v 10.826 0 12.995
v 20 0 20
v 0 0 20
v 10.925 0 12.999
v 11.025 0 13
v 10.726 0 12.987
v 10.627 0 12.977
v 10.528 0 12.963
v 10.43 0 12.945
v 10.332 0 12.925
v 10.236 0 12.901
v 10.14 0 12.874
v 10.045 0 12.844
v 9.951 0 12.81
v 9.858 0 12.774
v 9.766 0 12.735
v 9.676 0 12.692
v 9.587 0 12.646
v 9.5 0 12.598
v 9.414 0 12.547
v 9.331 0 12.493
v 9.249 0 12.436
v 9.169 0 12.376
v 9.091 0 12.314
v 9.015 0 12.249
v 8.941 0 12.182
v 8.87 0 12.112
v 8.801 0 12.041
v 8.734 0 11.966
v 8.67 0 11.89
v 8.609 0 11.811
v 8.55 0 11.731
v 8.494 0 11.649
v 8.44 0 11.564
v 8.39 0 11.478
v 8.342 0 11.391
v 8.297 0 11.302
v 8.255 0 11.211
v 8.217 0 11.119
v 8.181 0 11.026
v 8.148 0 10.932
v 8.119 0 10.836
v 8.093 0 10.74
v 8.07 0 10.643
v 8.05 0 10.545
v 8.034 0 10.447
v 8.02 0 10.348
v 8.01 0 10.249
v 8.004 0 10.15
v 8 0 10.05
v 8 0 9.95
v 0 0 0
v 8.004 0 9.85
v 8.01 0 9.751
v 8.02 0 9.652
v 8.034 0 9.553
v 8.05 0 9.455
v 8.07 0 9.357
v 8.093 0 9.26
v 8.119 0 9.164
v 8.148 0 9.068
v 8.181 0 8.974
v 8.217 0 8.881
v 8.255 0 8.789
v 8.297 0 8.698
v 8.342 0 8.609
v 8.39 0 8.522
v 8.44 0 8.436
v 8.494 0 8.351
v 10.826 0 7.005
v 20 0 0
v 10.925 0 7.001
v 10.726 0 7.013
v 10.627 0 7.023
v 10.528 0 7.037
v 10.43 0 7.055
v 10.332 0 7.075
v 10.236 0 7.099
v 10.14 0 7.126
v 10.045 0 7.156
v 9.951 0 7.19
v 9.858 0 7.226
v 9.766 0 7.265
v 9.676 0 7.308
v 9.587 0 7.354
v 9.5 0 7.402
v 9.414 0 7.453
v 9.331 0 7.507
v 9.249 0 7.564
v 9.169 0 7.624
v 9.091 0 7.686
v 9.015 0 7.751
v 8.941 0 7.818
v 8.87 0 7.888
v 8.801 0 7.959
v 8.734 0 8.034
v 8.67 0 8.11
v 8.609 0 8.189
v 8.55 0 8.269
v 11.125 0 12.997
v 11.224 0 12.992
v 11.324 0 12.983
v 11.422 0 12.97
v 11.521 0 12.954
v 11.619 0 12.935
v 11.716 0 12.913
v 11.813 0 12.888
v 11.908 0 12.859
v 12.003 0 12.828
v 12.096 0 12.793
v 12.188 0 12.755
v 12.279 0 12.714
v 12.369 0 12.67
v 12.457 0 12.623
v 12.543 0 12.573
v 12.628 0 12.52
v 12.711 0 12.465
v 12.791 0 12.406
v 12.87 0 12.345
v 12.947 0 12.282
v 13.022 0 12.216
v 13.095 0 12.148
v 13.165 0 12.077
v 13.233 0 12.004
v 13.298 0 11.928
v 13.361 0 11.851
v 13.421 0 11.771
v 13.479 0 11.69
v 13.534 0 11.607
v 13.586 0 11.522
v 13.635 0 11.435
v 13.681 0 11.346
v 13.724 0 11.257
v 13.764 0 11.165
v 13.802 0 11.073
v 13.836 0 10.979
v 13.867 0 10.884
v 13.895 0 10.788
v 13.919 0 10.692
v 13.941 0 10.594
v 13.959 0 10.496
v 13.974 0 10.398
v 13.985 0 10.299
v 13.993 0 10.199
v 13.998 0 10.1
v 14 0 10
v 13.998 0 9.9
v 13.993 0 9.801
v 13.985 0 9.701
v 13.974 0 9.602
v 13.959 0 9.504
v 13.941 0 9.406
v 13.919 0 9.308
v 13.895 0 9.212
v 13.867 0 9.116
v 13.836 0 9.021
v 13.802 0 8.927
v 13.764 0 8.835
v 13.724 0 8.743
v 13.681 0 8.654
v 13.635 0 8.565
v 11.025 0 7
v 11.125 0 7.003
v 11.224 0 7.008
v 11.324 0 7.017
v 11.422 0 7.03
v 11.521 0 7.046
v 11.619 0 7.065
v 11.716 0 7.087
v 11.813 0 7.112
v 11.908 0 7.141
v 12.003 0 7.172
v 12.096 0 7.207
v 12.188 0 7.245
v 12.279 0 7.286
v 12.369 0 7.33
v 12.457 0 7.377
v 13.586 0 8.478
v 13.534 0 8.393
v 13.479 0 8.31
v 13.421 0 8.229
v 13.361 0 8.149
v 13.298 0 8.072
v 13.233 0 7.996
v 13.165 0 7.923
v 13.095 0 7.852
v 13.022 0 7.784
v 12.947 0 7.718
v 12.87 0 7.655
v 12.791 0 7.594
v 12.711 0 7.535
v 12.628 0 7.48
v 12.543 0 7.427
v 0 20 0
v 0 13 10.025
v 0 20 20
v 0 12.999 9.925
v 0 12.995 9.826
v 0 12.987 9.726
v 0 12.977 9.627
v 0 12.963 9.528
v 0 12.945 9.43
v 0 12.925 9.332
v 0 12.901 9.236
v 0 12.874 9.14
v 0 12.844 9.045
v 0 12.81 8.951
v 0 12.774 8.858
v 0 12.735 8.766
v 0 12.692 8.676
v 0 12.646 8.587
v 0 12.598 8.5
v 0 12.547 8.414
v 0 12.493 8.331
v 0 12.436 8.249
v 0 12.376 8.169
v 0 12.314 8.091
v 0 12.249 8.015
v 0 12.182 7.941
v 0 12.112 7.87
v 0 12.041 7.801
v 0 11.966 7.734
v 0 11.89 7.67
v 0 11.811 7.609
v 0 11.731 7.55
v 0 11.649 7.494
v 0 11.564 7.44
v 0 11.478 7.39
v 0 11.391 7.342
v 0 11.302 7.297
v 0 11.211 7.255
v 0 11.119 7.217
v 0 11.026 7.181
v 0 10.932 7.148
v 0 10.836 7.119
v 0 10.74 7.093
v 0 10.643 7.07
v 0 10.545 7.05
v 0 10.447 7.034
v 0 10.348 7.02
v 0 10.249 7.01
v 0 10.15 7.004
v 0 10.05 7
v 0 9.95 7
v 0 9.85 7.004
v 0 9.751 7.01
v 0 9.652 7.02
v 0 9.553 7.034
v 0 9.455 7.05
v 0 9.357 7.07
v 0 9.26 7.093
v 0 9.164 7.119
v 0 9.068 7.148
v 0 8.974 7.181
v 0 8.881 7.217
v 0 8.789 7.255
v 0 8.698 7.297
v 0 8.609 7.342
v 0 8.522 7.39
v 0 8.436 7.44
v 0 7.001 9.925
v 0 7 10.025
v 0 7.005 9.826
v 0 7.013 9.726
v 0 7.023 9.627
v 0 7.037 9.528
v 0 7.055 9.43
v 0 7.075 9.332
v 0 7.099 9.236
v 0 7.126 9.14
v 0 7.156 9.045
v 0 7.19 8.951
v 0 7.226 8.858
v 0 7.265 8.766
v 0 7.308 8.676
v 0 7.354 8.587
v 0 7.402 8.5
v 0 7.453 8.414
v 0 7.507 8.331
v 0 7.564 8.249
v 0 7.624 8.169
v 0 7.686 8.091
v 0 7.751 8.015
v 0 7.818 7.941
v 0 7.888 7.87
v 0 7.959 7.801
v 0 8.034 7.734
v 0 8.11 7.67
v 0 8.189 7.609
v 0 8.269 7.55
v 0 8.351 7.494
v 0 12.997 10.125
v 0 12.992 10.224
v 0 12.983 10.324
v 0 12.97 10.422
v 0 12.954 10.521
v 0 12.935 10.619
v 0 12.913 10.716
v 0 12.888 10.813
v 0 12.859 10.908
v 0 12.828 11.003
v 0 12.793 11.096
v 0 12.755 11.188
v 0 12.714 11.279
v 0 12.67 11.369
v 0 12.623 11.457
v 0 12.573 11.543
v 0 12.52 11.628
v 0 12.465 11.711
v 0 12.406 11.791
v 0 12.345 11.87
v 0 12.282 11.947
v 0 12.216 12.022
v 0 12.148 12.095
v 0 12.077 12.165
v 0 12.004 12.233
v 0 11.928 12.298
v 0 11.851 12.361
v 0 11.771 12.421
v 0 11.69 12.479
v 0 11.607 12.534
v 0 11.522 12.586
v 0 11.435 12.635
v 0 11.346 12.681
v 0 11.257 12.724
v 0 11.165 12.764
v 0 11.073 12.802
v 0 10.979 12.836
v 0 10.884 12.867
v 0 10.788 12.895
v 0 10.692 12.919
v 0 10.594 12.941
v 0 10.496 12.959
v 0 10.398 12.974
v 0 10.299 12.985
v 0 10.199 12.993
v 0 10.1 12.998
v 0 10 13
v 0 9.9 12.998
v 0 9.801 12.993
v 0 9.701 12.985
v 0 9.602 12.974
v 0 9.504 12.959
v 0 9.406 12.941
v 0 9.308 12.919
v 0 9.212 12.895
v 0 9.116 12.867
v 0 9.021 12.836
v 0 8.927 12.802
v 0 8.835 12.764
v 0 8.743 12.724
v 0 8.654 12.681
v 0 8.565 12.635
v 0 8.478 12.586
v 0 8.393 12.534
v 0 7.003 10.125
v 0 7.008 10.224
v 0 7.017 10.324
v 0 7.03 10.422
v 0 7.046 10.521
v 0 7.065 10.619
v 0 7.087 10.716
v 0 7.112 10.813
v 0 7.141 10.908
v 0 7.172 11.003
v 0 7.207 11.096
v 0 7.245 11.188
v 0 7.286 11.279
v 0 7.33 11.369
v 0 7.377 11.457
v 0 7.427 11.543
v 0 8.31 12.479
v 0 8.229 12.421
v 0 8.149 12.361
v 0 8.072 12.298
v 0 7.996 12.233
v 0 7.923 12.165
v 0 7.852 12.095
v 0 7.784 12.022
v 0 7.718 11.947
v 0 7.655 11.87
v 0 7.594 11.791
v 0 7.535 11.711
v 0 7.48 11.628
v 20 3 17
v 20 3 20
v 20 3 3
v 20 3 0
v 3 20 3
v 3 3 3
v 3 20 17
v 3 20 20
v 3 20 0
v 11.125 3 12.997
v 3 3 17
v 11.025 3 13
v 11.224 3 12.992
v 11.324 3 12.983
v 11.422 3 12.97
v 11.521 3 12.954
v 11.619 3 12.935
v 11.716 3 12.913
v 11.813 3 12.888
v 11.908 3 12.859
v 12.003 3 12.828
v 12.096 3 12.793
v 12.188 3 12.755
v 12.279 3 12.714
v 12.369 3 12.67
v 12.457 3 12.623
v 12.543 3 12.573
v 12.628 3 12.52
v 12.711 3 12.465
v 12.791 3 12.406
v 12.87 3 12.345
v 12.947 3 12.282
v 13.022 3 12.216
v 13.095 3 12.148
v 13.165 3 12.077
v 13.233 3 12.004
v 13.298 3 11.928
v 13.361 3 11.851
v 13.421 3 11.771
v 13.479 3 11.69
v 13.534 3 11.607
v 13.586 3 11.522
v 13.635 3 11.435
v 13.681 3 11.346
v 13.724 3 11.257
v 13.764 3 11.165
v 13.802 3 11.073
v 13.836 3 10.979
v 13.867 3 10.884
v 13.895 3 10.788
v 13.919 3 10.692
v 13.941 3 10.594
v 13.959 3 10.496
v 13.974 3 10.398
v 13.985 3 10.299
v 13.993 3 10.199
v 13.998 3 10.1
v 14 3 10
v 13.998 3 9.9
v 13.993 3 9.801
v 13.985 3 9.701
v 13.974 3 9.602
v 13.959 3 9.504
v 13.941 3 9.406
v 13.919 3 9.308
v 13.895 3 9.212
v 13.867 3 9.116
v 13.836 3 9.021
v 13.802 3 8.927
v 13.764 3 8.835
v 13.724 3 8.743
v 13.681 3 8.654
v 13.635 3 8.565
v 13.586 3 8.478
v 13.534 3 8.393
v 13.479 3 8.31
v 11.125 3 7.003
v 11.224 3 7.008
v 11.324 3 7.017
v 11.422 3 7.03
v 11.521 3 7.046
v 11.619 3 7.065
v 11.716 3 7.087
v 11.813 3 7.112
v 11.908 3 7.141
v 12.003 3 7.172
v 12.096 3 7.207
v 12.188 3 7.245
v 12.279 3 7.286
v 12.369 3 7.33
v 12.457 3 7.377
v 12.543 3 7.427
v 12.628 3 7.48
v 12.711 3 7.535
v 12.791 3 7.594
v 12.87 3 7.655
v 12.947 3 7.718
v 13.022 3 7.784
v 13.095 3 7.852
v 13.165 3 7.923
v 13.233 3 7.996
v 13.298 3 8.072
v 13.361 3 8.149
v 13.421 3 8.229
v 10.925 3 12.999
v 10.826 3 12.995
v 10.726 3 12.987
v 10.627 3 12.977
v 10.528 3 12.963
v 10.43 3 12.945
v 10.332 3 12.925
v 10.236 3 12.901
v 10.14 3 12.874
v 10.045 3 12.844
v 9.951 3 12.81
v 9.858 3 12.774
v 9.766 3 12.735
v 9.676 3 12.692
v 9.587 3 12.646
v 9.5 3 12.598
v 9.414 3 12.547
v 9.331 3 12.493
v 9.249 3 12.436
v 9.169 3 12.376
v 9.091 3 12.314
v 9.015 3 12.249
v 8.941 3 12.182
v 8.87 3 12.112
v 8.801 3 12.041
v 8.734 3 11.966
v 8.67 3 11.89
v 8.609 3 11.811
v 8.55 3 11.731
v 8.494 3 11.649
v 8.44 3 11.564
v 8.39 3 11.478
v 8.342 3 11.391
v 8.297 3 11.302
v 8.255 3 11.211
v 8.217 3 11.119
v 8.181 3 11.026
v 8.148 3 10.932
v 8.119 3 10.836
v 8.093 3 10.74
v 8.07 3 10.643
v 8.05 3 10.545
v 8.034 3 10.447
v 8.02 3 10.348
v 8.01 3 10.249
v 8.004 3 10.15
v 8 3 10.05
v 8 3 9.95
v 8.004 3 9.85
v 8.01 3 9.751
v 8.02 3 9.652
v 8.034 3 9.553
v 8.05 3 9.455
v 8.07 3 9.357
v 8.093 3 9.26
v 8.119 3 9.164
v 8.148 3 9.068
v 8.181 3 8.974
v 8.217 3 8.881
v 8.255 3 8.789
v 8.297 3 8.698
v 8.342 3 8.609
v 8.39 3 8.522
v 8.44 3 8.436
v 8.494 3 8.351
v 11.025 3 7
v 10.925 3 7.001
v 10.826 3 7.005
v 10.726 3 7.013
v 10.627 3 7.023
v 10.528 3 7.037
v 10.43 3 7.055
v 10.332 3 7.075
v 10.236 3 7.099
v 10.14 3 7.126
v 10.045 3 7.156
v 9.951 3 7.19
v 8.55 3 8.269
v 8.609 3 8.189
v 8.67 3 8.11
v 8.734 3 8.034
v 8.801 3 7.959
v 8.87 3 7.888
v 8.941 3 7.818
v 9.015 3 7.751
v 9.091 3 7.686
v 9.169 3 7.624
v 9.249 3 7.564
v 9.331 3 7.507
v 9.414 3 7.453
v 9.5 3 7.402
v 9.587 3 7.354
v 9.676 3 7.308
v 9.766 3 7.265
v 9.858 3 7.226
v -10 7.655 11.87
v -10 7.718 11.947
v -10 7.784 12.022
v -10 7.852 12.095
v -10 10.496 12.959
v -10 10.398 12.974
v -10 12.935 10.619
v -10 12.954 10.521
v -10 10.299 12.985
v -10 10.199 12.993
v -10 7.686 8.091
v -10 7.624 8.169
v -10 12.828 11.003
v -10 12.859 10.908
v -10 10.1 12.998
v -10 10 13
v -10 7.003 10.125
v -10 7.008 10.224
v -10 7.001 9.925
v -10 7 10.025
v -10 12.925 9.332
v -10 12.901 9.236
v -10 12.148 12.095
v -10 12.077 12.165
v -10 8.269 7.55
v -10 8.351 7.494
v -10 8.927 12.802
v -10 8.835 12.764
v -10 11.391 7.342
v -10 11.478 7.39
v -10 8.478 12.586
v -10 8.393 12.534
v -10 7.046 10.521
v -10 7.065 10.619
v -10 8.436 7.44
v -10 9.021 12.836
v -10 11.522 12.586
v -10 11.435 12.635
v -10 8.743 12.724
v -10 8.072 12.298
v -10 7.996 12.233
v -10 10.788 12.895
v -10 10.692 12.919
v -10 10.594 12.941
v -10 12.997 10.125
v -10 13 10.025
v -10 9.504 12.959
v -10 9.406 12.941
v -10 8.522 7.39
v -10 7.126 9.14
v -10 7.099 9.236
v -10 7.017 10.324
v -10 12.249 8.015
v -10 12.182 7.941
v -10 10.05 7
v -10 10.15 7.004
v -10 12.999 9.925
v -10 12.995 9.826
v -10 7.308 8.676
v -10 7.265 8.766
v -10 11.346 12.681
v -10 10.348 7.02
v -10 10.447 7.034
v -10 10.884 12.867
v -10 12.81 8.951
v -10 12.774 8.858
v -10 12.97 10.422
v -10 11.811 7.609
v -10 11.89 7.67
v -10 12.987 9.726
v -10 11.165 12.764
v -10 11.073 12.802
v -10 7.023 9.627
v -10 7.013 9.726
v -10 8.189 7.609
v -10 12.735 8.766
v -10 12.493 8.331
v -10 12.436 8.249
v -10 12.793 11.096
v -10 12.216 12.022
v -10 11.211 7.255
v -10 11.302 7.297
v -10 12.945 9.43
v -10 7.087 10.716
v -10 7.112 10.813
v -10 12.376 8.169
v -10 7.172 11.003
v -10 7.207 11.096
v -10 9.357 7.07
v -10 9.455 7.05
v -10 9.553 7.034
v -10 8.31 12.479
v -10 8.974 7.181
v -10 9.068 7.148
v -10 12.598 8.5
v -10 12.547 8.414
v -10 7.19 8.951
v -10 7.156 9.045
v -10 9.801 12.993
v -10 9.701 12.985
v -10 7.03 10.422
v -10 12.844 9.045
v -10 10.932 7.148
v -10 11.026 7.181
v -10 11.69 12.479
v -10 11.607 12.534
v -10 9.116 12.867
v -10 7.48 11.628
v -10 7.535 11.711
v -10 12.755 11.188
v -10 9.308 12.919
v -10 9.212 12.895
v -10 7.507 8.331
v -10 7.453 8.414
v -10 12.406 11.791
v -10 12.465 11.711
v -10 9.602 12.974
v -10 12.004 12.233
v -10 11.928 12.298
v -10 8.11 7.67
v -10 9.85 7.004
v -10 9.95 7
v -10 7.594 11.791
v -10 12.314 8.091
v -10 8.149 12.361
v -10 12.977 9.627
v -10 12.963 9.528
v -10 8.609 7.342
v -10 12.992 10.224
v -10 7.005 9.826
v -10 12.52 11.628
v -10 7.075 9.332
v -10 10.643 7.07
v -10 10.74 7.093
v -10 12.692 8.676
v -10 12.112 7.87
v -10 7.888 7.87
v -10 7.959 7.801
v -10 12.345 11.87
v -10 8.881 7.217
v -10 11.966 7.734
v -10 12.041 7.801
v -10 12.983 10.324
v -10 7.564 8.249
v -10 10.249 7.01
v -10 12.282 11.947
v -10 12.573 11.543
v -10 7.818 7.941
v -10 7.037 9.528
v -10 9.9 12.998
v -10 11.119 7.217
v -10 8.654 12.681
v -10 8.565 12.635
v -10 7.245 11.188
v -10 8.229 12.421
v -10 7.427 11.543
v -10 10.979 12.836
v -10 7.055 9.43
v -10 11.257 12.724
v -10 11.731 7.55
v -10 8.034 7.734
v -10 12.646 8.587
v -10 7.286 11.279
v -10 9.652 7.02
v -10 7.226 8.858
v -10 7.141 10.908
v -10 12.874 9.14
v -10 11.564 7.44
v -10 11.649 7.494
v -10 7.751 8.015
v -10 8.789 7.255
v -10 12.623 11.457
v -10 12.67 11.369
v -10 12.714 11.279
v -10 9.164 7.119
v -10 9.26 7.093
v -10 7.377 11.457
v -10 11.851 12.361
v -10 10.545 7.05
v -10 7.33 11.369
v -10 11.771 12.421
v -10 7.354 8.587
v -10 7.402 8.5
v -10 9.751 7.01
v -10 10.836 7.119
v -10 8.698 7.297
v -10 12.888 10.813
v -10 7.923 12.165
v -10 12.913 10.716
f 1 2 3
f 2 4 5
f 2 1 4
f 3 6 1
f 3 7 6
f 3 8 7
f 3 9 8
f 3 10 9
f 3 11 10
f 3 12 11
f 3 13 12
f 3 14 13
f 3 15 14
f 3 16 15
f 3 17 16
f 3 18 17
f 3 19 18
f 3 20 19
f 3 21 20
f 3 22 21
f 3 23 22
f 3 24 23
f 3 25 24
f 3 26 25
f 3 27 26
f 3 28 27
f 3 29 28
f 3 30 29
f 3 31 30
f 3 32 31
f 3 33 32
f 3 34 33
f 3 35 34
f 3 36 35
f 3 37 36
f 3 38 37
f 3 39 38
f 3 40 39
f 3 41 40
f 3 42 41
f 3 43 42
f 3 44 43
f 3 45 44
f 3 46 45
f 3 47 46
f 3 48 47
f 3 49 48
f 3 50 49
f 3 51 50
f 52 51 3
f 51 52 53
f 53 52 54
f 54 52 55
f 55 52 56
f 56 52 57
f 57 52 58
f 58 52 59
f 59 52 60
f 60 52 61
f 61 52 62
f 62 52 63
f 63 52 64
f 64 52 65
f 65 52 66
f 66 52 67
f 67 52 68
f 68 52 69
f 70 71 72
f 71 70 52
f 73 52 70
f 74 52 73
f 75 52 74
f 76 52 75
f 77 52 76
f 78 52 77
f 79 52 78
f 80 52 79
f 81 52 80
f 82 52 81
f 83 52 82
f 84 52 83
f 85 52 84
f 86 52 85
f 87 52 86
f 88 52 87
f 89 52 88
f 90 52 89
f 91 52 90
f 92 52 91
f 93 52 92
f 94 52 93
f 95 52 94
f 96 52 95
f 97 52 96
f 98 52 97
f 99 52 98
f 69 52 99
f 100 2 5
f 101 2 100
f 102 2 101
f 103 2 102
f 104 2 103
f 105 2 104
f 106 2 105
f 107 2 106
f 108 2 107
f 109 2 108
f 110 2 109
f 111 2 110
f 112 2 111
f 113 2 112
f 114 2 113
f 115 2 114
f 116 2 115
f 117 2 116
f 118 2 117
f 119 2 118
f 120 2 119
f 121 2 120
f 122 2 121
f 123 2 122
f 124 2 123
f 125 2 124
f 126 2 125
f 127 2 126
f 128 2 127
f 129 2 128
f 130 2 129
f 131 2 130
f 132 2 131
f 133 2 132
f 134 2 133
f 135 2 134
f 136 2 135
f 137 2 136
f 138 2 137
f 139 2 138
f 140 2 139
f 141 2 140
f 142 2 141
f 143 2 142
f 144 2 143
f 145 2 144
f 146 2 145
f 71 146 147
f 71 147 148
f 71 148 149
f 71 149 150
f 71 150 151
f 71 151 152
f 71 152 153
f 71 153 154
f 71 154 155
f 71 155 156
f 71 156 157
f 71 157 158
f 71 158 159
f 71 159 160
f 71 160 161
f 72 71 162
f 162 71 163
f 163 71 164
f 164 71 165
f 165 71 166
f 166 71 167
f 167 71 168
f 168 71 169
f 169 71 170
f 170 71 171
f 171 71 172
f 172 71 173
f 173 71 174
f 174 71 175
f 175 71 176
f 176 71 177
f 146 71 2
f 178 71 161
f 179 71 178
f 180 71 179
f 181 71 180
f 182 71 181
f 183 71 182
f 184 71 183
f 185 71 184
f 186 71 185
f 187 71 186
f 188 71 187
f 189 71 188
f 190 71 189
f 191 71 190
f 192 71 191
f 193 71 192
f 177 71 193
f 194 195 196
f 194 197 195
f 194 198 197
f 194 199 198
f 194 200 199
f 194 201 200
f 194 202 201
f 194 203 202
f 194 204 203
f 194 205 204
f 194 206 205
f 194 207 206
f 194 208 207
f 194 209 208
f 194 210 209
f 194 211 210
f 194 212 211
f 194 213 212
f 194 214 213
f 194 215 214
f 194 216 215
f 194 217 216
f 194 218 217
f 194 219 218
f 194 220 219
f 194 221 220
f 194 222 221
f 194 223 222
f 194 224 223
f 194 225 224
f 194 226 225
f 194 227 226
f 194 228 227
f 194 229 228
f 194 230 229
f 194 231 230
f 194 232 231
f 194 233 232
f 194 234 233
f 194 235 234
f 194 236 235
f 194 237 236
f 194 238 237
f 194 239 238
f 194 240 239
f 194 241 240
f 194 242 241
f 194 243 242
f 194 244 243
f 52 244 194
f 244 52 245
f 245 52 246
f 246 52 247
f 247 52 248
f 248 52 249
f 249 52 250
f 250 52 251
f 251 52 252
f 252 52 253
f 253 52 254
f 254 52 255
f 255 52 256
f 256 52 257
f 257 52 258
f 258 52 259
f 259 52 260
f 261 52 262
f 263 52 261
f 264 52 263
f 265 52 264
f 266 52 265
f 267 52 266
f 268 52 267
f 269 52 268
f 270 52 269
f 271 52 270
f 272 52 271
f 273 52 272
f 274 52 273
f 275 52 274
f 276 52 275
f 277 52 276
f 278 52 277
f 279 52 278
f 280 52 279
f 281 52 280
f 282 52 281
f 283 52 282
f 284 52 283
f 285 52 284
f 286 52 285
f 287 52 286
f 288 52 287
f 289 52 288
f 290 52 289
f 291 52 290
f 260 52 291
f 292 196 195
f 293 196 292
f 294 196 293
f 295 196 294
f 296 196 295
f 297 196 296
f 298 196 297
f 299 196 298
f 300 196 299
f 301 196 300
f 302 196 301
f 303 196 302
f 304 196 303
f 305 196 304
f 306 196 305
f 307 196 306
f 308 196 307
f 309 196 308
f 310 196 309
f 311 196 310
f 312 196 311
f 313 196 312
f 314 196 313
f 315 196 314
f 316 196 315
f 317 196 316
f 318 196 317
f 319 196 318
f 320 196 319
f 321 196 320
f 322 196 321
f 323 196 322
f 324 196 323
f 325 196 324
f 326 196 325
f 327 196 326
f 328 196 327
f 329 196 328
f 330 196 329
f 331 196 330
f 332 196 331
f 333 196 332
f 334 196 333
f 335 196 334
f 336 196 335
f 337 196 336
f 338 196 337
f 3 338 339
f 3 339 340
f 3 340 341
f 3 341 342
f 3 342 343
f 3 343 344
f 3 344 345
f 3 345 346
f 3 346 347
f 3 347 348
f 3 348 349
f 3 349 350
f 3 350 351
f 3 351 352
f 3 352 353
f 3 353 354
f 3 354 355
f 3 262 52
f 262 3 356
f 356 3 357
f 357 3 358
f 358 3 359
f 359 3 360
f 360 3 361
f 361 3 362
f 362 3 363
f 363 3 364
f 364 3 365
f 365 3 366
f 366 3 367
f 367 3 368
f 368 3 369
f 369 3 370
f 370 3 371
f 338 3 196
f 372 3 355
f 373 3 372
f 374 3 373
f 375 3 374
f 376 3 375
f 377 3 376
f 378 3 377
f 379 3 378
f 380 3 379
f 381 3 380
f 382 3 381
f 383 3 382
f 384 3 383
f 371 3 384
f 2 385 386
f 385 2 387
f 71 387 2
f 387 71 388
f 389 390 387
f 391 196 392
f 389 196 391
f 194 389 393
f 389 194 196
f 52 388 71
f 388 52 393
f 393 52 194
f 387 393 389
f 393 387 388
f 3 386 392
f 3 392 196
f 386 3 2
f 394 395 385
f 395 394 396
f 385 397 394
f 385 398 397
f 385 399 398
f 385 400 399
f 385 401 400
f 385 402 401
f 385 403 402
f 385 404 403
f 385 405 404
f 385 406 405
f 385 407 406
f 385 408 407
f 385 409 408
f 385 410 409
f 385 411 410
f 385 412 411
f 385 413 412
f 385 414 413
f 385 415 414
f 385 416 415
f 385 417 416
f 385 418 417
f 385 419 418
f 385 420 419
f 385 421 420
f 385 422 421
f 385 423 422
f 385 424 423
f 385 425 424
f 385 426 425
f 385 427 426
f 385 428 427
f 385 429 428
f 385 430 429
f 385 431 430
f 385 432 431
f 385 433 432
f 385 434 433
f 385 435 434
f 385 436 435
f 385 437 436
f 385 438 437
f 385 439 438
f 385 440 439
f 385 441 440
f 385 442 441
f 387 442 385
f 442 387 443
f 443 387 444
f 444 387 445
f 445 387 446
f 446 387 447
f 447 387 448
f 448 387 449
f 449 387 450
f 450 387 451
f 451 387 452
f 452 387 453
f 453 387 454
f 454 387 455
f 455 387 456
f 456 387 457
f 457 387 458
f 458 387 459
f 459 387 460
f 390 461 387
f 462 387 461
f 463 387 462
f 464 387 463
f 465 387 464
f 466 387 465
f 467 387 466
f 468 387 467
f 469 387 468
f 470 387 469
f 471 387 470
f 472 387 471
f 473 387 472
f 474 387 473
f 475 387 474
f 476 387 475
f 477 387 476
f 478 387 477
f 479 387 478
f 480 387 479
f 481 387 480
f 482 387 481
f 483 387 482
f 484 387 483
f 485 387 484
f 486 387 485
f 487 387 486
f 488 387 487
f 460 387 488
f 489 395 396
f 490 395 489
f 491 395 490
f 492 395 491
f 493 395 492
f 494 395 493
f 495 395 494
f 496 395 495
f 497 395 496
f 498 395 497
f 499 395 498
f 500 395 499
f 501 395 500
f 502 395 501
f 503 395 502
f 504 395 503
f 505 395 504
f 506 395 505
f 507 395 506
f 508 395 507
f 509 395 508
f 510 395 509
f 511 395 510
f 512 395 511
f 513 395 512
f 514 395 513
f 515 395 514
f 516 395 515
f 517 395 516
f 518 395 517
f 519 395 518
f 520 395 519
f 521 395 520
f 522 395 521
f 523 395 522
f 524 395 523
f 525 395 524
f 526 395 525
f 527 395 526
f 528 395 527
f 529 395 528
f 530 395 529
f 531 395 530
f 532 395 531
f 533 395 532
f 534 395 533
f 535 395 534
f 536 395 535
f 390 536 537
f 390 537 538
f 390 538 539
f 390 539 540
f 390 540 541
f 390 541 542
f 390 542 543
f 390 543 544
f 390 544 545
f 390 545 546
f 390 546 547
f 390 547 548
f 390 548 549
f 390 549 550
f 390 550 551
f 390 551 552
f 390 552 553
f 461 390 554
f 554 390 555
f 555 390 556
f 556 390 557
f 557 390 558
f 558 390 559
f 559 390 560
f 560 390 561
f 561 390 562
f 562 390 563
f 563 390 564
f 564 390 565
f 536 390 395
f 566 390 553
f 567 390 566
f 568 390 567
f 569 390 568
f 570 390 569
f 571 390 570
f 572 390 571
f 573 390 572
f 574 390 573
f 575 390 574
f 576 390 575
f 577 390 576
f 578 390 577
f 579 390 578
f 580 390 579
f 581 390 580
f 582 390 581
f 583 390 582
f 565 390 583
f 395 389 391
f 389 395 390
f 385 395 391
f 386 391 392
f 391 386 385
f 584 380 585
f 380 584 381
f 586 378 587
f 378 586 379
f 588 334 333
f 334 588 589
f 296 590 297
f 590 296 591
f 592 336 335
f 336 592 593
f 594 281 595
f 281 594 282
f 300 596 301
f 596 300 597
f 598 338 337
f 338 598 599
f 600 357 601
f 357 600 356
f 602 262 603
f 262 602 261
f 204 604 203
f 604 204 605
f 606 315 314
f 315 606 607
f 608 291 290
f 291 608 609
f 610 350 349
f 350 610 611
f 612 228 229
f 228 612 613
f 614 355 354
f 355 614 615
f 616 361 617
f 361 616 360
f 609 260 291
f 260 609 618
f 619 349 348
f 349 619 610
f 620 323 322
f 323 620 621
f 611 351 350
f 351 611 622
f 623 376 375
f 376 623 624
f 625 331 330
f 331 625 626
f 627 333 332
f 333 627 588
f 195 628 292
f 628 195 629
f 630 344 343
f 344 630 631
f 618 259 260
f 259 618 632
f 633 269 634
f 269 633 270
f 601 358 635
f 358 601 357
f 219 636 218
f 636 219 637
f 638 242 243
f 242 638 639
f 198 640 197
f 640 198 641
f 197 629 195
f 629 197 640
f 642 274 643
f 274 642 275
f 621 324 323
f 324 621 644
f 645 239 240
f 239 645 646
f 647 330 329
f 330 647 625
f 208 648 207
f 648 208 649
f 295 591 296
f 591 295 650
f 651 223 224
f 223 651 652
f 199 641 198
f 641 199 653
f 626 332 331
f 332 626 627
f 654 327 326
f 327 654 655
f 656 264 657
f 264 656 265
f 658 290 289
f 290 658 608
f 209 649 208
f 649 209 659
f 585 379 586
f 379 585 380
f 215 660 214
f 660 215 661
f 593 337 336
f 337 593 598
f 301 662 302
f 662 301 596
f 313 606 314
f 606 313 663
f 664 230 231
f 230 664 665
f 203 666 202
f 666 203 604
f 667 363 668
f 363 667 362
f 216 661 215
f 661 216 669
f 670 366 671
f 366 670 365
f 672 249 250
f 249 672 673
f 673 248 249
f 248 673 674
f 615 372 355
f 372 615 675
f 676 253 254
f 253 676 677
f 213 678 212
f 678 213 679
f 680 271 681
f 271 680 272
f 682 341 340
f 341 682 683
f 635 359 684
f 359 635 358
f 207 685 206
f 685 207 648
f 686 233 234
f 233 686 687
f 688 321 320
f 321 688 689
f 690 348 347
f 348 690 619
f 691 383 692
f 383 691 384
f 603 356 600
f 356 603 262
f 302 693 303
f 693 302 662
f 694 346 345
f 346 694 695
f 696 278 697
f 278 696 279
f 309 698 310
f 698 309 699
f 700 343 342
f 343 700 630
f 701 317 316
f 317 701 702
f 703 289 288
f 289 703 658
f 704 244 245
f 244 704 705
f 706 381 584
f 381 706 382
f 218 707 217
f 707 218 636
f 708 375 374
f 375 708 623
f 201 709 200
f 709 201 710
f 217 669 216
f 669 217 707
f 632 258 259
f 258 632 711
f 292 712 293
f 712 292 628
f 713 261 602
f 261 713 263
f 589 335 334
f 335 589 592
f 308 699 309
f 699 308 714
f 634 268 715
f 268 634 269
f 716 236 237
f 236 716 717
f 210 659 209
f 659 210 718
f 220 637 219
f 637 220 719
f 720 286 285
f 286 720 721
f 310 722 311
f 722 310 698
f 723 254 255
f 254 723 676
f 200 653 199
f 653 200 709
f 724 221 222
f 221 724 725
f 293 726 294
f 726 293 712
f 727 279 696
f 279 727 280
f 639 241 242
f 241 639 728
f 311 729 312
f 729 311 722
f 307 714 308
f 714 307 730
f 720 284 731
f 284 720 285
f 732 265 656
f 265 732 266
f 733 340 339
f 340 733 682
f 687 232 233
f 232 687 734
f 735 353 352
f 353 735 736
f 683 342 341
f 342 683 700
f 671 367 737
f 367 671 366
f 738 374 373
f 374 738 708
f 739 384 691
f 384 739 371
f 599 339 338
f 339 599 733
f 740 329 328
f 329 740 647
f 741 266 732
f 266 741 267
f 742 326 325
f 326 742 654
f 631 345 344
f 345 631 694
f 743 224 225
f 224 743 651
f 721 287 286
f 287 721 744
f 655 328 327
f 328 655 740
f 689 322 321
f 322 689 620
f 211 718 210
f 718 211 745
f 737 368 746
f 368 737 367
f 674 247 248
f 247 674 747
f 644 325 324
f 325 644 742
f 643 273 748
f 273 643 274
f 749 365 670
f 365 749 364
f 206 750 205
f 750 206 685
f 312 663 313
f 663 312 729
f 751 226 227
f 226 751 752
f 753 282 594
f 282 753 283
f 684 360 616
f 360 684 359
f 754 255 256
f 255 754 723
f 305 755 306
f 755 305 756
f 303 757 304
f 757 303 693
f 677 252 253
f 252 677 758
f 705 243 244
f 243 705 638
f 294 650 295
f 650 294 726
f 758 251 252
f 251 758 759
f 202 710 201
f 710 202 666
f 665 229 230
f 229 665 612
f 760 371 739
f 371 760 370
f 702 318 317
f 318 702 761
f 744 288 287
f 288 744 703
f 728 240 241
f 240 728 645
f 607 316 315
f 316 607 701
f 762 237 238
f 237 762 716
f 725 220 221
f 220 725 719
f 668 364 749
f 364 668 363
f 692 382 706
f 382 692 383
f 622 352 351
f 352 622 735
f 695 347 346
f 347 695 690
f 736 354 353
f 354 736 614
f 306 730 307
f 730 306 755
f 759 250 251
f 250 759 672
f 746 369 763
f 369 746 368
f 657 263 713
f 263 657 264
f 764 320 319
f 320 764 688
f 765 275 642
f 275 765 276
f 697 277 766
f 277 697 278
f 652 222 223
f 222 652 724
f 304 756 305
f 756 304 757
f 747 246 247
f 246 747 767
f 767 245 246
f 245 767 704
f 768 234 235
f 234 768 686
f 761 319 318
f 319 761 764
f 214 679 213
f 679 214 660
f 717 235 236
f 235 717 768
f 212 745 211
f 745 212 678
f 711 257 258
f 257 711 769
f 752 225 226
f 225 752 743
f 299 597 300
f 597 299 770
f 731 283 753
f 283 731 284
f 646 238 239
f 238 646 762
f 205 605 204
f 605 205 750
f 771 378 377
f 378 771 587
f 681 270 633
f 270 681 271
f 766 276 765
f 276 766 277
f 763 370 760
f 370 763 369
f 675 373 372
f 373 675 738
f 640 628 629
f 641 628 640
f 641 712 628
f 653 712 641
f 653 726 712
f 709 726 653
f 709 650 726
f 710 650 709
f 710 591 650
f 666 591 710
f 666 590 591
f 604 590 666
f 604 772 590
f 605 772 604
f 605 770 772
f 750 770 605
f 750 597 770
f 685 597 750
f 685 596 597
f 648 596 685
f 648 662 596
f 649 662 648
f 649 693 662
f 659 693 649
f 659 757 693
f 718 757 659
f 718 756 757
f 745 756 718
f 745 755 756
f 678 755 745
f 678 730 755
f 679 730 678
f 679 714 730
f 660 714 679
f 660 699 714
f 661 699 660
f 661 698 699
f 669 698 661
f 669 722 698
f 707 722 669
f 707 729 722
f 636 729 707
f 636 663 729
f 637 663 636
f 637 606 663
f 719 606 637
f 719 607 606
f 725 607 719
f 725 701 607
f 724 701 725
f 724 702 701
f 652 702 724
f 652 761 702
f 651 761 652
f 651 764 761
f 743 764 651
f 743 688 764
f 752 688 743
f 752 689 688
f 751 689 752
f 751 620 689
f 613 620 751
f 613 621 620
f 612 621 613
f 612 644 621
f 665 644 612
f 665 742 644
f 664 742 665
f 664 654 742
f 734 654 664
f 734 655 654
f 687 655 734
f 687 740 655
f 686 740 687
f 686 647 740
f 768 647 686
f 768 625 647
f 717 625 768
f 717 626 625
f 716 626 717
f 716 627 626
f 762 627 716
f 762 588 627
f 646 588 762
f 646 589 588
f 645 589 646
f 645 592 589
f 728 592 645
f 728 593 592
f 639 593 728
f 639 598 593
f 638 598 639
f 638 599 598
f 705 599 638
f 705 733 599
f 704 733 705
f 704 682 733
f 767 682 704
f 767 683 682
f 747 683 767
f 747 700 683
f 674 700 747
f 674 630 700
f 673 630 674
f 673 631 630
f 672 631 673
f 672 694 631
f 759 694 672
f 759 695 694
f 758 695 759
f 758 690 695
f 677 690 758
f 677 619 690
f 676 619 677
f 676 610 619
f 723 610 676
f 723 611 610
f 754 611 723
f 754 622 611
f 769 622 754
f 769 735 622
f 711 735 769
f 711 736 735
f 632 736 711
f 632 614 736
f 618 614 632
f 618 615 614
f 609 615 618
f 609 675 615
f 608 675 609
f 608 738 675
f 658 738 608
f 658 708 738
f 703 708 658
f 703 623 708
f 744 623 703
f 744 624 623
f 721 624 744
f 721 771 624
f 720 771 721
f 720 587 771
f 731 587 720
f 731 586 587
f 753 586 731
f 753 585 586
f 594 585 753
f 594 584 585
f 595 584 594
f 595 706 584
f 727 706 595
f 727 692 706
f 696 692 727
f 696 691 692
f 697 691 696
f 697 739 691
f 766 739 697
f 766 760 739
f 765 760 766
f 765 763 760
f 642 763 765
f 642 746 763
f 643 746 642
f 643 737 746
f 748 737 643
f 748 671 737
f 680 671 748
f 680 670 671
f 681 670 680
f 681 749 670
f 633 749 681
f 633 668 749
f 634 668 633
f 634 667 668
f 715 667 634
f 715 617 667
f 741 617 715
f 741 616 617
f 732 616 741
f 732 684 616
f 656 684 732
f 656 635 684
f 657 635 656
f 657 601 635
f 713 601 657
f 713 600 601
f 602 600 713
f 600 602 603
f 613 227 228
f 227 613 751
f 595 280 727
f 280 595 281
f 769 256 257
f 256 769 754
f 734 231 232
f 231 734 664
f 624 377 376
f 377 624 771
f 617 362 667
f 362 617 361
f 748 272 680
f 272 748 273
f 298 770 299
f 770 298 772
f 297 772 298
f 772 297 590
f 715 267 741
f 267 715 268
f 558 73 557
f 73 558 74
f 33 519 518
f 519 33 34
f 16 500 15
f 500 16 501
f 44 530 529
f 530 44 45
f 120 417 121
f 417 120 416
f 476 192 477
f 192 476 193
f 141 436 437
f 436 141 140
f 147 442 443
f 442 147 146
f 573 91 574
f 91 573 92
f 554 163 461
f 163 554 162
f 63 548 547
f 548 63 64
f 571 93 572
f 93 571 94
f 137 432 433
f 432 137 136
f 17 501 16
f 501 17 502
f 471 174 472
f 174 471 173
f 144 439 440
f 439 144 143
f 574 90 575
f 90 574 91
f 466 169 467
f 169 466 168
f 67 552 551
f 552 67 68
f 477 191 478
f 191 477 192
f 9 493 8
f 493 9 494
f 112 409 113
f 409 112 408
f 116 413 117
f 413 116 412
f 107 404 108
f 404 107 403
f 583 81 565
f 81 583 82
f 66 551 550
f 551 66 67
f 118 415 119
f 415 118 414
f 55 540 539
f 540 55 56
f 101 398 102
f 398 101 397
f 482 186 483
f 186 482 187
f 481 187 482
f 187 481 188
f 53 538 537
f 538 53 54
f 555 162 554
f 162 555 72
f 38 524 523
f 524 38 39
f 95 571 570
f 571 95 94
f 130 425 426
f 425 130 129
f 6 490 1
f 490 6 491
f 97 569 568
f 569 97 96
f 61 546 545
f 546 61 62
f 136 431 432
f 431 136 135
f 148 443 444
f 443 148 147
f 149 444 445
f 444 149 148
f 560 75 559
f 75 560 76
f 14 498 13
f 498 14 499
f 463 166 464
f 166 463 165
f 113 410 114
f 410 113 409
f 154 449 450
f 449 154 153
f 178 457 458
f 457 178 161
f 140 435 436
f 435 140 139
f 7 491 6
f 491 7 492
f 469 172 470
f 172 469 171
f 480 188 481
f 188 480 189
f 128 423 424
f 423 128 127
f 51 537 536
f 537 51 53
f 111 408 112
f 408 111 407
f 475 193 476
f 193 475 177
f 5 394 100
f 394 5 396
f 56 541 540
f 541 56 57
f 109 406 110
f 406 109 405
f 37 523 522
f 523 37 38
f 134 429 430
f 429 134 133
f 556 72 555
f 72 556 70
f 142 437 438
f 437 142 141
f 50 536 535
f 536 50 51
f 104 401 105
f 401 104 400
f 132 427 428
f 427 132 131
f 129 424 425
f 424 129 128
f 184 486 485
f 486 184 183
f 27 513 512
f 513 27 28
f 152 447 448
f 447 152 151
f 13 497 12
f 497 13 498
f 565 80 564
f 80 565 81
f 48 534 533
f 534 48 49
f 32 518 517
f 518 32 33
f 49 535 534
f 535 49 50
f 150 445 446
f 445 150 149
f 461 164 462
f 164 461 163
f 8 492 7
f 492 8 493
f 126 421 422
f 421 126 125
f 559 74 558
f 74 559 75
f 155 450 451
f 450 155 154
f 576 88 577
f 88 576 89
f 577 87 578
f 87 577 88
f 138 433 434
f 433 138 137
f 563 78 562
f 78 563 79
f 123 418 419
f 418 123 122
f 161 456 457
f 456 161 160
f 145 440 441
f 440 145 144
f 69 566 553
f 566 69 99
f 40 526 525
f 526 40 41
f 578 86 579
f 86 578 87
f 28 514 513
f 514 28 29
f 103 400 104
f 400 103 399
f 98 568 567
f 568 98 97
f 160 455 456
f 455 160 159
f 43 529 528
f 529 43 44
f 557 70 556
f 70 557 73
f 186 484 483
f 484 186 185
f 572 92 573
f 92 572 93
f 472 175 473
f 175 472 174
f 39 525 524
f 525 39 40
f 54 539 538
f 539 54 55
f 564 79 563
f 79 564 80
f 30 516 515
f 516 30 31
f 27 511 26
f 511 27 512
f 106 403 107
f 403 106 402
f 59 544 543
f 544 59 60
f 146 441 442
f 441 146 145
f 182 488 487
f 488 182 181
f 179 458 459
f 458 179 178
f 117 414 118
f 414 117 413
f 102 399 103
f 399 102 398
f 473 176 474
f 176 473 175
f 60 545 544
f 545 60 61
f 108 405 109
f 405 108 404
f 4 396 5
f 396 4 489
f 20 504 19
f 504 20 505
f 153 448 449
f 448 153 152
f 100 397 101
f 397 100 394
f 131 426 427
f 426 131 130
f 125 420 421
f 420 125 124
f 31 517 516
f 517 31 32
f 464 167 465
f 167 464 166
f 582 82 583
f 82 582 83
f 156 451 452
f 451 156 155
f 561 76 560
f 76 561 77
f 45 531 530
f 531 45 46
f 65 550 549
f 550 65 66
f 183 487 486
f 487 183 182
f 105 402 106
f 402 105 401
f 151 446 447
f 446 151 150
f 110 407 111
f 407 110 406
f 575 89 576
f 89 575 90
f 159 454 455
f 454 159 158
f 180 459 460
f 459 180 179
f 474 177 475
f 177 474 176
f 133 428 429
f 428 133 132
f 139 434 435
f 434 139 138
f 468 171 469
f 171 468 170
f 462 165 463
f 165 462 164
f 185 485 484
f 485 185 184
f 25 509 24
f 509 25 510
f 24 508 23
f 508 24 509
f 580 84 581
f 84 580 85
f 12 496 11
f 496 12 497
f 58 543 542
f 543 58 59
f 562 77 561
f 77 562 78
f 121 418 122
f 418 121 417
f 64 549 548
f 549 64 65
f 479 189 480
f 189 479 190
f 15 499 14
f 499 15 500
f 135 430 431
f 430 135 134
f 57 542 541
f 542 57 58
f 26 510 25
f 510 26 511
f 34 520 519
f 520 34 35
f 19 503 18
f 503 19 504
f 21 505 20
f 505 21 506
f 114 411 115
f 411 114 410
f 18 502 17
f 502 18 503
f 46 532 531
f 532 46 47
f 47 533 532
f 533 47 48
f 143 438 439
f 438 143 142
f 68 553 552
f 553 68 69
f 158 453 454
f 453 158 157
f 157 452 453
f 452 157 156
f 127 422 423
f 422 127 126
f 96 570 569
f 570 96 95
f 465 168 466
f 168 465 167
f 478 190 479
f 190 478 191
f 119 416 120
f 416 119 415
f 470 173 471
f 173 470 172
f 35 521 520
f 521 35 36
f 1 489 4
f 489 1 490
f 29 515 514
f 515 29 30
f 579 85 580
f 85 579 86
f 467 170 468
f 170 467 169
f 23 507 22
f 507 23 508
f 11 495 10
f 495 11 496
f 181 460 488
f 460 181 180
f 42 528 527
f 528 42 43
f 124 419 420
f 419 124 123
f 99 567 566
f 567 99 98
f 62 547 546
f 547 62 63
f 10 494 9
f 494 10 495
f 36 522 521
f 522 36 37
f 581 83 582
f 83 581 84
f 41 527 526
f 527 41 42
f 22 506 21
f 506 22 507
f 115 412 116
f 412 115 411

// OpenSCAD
t = 3;
w = 20;

o1 = 12;
d1 = 6;
o2 = 12;
d2 = 6.2;
l2 = 7;

$fa = 0.1;
$fs = 0.1;

module mount_shape(corner = false) {
    a1 = [
        [0,0],
        [20,0],
        [20,t],
    ];
    a2 = corner ? [[t,t]] : [];
    a3 = [
        [t, 20],
        [0, 20]
    ];
    polygon(concat(a1,a2,a3));
}

difference() {
    union() {
        linear_extrude(t)
        mount_shape(false);
        linear_extrude(w)
        mount_shape(true);
        translate([0,0,w-t])
        linear_extrude(t)
        mount_shape(false);
        
        translate([t,10,10])
        rotate([0,-90,0])
        cylinder(d = 6, h = 10+t);
    }
    
    #translate([11,-1,10]) rotate([-90,0,0]) cylinder(d = 6, h = t+2);
}
